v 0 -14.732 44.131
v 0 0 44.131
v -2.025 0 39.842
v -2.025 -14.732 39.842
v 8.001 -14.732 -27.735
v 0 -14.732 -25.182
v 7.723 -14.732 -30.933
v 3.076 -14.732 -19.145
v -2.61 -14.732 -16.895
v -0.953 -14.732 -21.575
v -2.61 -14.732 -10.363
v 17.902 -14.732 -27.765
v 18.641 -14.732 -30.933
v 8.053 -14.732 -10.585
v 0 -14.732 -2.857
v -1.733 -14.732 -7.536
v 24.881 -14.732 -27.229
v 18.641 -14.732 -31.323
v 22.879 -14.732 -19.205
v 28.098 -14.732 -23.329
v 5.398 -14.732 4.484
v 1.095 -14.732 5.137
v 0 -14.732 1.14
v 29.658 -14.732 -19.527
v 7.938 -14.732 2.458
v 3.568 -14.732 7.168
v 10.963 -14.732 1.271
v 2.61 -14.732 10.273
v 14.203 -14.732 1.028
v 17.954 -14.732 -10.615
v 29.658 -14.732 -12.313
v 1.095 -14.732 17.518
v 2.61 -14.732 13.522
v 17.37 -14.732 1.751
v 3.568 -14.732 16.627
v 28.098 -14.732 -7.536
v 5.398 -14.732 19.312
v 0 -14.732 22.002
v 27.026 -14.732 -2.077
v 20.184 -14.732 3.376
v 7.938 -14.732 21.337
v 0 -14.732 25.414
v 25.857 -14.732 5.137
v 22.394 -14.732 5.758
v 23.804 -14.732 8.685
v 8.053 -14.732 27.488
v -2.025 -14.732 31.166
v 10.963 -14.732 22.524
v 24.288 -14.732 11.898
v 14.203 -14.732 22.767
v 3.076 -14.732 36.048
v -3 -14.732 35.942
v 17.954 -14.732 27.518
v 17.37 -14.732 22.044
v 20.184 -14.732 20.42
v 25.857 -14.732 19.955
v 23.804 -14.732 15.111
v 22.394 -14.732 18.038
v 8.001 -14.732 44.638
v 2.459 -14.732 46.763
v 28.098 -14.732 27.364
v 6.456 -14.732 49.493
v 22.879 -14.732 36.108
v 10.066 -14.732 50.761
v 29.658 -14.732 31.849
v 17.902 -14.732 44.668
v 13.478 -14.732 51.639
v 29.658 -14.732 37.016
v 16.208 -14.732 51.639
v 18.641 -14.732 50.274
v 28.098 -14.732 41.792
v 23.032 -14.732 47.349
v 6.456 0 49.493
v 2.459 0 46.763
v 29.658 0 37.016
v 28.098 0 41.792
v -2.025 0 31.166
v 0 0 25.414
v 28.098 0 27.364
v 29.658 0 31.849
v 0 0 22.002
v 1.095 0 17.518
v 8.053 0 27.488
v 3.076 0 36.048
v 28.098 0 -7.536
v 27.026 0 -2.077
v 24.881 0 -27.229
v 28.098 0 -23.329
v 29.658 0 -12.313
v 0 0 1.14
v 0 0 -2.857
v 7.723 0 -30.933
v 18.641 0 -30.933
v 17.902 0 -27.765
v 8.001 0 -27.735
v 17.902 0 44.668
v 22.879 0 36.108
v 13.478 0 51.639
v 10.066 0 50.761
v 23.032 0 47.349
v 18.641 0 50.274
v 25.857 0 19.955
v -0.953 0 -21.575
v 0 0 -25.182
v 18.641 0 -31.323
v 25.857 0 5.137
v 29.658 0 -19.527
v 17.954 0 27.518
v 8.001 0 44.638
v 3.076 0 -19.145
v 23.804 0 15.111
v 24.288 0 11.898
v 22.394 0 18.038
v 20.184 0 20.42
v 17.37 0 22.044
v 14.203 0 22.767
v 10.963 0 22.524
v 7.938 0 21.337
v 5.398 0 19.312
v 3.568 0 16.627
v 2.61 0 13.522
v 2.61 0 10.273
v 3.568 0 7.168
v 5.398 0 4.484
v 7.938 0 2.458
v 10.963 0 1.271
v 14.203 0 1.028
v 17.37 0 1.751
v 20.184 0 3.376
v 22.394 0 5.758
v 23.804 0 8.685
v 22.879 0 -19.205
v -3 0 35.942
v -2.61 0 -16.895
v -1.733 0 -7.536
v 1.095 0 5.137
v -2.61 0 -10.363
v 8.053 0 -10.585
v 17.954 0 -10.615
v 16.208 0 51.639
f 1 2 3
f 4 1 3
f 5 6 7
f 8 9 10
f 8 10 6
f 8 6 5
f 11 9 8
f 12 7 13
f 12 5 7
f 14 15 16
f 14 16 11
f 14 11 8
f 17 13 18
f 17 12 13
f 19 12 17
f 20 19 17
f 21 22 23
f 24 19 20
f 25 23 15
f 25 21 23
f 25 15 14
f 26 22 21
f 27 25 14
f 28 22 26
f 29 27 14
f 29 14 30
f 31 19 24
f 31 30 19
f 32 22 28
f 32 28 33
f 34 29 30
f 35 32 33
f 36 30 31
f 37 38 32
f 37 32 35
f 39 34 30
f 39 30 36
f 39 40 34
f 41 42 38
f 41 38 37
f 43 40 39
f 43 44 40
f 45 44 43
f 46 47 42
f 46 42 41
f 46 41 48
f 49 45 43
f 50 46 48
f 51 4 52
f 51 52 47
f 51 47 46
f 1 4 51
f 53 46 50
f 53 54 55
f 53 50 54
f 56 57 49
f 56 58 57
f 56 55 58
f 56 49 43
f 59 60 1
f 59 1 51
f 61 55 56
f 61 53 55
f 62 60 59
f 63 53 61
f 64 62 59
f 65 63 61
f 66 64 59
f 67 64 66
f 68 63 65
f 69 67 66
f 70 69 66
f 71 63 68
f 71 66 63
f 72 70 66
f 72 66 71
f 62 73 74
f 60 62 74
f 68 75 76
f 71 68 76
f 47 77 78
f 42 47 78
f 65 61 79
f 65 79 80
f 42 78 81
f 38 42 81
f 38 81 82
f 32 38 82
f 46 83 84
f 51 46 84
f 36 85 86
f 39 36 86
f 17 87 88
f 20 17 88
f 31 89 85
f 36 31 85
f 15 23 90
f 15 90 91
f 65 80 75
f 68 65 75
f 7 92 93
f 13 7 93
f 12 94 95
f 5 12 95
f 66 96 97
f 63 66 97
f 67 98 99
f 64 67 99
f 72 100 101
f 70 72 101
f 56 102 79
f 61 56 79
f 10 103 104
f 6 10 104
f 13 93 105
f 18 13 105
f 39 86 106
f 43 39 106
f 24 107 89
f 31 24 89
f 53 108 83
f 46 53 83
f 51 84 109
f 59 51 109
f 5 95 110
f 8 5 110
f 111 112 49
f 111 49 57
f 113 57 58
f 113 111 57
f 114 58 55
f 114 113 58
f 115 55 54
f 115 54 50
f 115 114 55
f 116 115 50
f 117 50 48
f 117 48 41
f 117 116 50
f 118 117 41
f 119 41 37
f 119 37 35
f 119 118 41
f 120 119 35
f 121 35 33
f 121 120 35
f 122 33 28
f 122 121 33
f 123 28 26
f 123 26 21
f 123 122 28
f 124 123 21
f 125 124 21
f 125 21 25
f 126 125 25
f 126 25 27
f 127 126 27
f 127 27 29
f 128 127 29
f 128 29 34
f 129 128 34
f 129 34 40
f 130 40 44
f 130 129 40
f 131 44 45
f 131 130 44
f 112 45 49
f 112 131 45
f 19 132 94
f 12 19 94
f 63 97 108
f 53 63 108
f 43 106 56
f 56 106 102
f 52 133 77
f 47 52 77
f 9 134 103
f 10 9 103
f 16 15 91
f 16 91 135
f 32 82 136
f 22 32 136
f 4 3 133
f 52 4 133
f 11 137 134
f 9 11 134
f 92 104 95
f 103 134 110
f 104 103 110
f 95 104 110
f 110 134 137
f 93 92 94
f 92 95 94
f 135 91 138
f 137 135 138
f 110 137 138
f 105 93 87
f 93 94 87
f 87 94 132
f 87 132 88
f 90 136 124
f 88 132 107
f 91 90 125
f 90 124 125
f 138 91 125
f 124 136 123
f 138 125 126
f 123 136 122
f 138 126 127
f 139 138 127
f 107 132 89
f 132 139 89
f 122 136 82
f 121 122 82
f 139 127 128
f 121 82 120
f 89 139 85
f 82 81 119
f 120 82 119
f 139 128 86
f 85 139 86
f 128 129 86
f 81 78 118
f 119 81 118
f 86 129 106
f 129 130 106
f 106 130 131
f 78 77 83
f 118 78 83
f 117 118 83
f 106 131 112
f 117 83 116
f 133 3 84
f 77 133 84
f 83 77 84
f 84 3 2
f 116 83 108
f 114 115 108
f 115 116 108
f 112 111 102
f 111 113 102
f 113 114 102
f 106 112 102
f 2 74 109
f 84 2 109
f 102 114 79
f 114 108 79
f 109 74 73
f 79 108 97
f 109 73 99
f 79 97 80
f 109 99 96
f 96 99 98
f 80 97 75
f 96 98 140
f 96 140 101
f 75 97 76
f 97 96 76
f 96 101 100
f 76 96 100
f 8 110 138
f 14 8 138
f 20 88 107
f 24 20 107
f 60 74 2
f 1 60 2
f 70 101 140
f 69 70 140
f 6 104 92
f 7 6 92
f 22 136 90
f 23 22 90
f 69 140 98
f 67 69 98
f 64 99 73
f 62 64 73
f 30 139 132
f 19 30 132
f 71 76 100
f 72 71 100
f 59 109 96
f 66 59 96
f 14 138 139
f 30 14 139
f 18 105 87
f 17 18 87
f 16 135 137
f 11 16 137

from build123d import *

# Parameters (mm, degrees)
F0_R     = 10.9
F1_DEPTH = 14.732


with BuildPart() as f1:
    # F0 (on Front) → F1 (new body)
    with BuildSketch(Plane.XZ):
        Polygon((10.065964, 50.761367), (6.456376, 49.49288), (2.45947, 46.763286), (0, 44.131174), (-2.024869, 39.841811), (-2.999724, 35.942386), (-2.024869, 31.165595), (0, 25.413946), (0, 22.001951), (1.09467, 17.517616), (1.09467, 8.451459), (1.09467, 5.13695), (0, 1.140108), (0, -2.856889), (-1.732659, -7.536301), (-2.610176, -10.363446), (-2.610176, -13.19059), (-2.610176, -16.895124), (-0.953385, -21.574536), (0, -25.181582), (7.722604, -30.933358), (18.641215, -30.933358), (18.641215, -31.32331), (24.880612, -27.228824), (28.097883, -23.329314), (29.657858, -19.527293), (29.657858, -16.895124), (29.657858, -12.3132), (28.097883, -7.536301), (27.026469, -2.076987), (25.856924, 5.13695), (25.856924, 12.156223), (25.856924, 19.955242), (28.097883, 27.364309), (29.657858, 31.848747), (29.657858, 37.015595), (28.097883, 41.792495), (23.031681, 47.349298), (18.641215, 50.273932), (16.20773, 51.63876), (13.478043, 51.63876), align=None)
        Polygon((22.879082, -19.204851), (17.902447, -27.764871), (8.000935, -27.734988), (3.076058, -19.145086), (8.052694, -10.585066), (17.954206, -10.614949), align=None, mode=Mode.SUBTRACT)
        Polygon((17.902447, 44.667789), (22.879082, 36.10777), (17.954206, 27.517867), (8.052694, 27.487984), (3.076058, 36.048004), (8.000935, 44.637906), align=None, mode=Mode.SUBTRACT)
        with Locations((13.388105, 11.897694)):
            Circle(F0_R, mode=Mode.SUBTRACT)
    extrude(amount=F1_DEPTH)


solid = f1.part
